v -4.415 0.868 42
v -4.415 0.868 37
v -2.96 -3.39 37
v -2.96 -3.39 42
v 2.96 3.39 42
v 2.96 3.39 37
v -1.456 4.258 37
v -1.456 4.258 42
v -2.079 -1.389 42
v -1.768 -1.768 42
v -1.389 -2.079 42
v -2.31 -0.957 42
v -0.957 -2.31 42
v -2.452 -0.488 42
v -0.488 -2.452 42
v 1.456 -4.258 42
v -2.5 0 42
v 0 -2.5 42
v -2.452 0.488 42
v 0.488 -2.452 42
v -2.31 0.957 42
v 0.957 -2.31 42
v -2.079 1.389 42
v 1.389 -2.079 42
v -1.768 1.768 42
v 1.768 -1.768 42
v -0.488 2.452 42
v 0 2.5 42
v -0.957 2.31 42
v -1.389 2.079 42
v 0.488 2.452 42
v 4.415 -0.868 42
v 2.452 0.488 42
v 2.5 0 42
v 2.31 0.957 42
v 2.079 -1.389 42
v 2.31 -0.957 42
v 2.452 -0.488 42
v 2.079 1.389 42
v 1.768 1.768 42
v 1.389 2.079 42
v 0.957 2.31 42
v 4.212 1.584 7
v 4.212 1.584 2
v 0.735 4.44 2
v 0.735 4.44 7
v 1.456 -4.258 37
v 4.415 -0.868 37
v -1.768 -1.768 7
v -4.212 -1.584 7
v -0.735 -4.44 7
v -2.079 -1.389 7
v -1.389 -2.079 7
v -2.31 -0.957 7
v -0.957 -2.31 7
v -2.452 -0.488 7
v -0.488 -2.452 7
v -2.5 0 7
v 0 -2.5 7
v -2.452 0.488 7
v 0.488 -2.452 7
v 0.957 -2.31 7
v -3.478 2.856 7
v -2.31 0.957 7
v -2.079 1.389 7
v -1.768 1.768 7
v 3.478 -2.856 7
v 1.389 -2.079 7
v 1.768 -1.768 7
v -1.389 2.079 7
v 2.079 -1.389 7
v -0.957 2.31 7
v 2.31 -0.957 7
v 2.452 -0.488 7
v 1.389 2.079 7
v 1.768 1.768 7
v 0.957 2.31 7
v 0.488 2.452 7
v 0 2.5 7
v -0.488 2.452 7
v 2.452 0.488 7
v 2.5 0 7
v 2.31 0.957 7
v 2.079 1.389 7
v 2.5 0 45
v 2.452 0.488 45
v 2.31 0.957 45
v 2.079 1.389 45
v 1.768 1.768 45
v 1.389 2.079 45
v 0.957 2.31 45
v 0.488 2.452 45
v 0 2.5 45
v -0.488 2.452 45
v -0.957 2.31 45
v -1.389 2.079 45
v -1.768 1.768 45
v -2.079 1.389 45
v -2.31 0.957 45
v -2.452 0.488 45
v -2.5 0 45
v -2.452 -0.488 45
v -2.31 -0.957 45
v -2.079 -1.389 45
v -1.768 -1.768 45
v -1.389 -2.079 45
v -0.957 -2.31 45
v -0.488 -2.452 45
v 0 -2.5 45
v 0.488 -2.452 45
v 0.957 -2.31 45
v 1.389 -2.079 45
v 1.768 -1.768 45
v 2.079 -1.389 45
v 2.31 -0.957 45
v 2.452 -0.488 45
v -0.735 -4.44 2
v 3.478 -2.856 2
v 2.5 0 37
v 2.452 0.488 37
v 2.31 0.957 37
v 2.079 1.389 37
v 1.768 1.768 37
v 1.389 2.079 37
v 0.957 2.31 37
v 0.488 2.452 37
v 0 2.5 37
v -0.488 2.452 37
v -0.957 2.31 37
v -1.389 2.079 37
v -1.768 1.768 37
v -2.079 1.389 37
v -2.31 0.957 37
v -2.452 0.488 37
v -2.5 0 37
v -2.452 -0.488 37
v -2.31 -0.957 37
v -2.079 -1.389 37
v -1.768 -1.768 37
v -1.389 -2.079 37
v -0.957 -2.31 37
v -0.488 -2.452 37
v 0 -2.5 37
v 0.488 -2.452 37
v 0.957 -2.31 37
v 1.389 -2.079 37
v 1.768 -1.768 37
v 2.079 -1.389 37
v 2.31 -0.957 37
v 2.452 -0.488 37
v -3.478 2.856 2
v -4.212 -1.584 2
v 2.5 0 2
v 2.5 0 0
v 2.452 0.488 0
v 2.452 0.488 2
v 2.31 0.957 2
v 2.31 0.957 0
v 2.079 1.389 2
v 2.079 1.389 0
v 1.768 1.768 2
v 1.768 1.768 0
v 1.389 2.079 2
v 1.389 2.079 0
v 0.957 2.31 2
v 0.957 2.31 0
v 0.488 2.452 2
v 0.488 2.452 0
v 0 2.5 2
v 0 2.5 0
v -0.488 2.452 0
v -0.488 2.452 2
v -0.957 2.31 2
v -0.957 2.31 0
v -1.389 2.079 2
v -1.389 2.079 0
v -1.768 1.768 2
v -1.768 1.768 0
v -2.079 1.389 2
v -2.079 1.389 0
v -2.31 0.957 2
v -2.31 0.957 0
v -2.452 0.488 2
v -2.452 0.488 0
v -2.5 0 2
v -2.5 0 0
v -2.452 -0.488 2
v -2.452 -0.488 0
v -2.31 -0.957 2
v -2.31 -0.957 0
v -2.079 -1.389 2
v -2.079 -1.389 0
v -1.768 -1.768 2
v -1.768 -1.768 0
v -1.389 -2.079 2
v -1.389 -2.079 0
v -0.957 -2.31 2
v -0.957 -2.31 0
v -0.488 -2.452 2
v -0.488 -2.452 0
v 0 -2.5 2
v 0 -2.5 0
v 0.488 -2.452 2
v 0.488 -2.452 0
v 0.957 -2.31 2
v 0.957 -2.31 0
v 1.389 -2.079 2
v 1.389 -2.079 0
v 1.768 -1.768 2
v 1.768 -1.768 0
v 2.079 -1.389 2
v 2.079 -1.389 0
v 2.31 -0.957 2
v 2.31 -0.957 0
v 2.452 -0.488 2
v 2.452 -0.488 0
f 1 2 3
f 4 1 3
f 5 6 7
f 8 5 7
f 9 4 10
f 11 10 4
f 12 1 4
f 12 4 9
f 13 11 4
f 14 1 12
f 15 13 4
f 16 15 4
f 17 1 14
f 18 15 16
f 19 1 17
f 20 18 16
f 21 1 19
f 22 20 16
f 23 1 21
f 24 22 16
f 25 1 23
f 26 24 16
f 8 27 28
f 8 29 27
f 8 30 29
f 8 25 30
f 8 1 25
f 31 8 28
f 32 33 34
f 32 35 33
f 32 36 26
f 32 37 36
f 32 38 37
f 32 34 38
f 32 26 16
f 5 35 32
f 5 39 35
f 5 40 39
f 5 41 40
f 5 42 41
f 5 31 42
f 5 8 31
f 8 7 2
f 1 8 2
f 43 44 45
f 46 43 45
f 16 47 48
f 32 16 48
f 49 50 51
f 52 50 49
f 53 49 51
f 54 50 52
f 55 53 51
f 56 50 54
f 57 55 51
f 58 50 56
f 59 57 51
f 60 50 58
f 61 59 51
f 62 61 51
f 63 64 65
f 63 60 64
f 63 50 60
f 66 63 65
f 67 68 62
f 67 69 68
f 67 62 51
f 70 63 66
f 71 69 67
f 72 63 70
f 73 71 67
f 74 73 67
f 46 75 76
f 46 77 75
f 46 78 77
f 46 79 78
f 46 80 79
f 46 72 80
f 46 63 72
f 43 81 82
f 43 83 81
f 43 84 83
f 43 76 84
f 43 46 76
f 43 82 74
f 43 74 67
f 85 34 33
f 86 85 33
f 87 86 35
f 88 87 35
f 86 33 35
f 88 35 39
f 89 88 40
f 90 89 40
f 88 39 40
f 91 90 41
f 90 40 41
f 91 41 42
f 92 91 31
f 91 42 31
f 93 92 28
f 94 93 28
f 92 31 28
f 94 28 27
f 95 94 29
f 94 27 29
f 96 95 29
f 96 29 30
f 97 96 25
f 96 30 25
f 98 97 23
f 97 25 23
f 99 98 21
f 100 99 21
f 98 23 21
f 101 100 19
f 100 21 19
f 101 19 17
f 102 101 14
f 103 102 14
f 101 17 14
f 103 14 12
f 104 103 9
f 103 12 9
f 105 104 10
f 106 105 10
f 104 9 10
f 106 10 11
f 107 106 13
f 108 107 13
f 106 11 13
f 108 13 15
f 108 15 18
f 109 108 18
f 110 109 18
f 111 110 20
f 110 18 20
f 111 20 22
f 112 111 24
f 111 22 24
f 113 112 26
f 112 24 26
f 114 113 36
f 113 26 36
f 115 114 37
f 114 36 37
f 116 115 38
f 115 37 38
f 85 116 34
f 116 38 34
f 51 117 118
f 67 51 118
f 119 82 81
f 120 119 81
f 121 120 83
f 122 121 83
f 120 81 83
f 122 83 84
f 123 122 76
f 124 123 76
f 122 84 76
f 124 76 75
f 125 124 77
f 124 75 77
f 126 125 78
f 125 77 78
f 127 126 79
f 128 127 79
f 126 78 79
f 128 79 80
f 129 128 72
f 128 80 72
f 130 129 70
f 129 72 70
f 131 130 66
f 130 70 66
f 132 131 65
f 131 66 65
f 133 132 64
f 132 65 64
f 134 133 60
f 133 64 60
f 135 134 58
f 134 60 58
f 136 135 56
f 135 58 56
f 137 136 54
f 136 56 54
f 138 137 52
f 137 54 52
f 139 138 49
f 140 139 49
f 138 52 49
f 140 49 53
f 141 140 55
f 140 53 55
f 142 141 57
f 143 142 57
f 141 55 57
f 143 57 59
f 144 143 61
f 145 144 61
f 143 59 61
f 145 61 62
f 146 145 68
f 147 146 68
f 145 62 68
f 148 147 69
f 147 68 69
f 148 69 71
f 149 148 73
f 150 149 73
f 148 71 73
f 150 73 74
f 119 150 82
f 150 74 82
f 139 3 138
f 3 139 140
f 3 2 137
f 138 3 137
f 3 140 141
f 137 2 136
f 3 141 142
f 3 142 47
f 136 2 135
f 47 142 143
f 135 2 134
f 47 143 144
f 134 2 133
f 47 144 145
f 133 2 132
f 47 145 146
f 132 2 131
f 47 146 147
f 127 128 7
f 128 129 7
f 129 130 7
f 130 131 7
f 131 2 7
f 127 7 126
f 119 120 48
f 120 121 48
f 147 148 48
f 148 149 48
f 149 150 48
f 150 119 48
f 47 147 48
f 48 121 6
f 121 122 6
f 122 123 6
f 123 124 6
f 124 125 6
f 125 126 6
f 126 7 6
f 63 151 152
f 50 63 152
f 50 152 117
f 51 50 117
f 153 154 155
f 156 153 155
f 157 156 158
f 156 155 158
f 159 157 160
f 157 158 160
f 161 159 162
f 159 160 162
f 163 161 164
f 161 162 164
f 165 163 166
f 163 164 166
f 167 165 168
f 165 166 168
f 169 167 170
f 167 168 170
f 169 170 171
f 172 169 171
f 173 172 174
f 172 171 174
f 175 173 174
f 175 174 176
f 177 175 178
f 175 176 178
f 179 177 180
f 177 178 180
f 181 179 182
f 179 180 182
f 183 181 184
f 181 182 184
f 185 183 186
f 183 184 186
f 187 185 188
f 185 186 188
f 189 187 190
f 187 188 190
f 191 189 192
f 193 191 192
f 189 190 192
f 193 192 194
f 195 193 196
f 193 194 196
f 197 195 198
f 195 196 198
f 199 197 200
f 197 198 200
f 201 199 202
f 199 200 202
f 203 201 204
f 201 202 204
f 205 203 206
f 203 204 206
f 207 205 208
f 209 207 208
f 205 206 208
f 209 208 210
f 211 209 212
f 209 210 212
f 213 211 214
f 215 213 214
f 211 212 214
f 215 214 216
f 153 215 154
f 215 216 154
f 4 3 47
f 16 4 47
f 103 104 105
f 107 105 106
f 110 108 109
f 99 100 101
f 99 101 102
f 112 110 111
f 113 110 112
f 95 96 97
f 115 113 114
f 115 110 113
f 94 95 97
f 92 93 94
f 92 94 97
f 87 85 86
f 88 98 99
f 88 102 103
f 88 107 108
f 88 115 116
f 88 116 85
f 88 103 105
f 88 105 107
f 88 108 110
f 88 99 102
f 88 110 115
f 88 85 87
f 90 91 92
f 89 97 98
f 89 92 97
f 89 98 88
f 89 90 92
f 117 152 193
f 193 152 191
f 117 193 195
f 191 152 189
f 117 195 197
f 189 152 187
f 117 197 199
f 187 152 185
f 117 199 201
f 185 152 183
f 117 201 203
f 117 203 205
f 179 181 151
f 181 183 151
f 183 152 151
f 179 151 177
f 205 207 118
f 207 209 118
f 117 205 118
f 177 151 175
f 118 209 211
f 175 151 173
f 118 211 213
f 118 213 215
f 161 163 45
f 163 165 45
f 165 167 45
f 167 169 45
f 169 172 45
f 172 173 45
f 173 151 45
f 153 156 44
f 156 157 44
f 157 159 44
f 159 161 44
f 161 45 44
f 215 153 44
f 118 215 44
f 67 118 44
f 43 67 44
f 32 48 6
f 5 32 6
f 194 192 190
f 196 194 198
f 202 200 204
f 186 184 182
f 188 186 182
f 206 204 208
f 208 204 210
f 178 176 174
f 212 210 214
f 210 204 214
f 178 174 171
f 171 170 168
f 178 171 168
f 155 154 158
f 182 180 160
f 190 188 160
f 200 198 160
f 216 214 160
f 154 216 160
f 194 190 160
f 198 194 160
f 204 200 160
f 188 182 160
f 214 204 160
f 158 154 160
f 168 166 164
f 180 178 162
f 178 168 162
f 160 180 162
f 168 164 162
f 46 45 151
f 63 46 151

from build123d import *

# Parameters (mm, degrees)
SKETCH_R     = 2.5
PAD_DEPTH    = 2
PAD001_DEPTH = 5
SKETCH002_R  = 2.5
PAD002_DEPTH = 30
PAD003_DEPTH = 5
SKETCH004_R  = 2.5
PAD004_DEPTH = 3


with BuildPart() as part:
    # Sketch → Pad (new body)
    with BuildSketch(Plane.XY):
        Circle(SKETCH_R)
    extrude(amount=PAD_DEPTH)

    # Sketch001 (on Face3 of Pad) → Pad001 (join)
    with BuildSketch(Plane.XY.offset(2)):
        Polygon((0.734523, 4.439648), (-3.477586, 2.85594), (-4.21211, -1.583708), (-0.734523, -4.439648), (3.477586, -2.85594), (4.21211, 1.583708), align=None)
    extrude(amount=PAD001_DEPTH)

    # Sketch002 (on Face5 of Pad001) → Pad002 (join)
    with BuildSketch(Plane.XY.offset(7)):
        Circle(SKETCH002_R)
    extrude(amount=PAD002_DEPTH)

    # Sketch003 (on Face12 of Pad002) → Pad003 (join)
    with BuildSketch(Plane.XY.offset(37)):
        Polygon((-1.455794, 4.258012), (-4.415443, 0.868251), (-2.959649, -3.38976), (1.455794, -4.258012), (4.415443, -0.868251), (2.959649, 3.38976), align=None)
    extrude(amount=PAD003_DEPTH)

    # Sketch004 (on Face5 of Pad003) → Pad004 (join)
    with BuildSketch(Plane.XY.offset(42)):
        Circle(SKETCH004_R)
    extrude(amount=PAD004_DEPTH)


solid = part.part
